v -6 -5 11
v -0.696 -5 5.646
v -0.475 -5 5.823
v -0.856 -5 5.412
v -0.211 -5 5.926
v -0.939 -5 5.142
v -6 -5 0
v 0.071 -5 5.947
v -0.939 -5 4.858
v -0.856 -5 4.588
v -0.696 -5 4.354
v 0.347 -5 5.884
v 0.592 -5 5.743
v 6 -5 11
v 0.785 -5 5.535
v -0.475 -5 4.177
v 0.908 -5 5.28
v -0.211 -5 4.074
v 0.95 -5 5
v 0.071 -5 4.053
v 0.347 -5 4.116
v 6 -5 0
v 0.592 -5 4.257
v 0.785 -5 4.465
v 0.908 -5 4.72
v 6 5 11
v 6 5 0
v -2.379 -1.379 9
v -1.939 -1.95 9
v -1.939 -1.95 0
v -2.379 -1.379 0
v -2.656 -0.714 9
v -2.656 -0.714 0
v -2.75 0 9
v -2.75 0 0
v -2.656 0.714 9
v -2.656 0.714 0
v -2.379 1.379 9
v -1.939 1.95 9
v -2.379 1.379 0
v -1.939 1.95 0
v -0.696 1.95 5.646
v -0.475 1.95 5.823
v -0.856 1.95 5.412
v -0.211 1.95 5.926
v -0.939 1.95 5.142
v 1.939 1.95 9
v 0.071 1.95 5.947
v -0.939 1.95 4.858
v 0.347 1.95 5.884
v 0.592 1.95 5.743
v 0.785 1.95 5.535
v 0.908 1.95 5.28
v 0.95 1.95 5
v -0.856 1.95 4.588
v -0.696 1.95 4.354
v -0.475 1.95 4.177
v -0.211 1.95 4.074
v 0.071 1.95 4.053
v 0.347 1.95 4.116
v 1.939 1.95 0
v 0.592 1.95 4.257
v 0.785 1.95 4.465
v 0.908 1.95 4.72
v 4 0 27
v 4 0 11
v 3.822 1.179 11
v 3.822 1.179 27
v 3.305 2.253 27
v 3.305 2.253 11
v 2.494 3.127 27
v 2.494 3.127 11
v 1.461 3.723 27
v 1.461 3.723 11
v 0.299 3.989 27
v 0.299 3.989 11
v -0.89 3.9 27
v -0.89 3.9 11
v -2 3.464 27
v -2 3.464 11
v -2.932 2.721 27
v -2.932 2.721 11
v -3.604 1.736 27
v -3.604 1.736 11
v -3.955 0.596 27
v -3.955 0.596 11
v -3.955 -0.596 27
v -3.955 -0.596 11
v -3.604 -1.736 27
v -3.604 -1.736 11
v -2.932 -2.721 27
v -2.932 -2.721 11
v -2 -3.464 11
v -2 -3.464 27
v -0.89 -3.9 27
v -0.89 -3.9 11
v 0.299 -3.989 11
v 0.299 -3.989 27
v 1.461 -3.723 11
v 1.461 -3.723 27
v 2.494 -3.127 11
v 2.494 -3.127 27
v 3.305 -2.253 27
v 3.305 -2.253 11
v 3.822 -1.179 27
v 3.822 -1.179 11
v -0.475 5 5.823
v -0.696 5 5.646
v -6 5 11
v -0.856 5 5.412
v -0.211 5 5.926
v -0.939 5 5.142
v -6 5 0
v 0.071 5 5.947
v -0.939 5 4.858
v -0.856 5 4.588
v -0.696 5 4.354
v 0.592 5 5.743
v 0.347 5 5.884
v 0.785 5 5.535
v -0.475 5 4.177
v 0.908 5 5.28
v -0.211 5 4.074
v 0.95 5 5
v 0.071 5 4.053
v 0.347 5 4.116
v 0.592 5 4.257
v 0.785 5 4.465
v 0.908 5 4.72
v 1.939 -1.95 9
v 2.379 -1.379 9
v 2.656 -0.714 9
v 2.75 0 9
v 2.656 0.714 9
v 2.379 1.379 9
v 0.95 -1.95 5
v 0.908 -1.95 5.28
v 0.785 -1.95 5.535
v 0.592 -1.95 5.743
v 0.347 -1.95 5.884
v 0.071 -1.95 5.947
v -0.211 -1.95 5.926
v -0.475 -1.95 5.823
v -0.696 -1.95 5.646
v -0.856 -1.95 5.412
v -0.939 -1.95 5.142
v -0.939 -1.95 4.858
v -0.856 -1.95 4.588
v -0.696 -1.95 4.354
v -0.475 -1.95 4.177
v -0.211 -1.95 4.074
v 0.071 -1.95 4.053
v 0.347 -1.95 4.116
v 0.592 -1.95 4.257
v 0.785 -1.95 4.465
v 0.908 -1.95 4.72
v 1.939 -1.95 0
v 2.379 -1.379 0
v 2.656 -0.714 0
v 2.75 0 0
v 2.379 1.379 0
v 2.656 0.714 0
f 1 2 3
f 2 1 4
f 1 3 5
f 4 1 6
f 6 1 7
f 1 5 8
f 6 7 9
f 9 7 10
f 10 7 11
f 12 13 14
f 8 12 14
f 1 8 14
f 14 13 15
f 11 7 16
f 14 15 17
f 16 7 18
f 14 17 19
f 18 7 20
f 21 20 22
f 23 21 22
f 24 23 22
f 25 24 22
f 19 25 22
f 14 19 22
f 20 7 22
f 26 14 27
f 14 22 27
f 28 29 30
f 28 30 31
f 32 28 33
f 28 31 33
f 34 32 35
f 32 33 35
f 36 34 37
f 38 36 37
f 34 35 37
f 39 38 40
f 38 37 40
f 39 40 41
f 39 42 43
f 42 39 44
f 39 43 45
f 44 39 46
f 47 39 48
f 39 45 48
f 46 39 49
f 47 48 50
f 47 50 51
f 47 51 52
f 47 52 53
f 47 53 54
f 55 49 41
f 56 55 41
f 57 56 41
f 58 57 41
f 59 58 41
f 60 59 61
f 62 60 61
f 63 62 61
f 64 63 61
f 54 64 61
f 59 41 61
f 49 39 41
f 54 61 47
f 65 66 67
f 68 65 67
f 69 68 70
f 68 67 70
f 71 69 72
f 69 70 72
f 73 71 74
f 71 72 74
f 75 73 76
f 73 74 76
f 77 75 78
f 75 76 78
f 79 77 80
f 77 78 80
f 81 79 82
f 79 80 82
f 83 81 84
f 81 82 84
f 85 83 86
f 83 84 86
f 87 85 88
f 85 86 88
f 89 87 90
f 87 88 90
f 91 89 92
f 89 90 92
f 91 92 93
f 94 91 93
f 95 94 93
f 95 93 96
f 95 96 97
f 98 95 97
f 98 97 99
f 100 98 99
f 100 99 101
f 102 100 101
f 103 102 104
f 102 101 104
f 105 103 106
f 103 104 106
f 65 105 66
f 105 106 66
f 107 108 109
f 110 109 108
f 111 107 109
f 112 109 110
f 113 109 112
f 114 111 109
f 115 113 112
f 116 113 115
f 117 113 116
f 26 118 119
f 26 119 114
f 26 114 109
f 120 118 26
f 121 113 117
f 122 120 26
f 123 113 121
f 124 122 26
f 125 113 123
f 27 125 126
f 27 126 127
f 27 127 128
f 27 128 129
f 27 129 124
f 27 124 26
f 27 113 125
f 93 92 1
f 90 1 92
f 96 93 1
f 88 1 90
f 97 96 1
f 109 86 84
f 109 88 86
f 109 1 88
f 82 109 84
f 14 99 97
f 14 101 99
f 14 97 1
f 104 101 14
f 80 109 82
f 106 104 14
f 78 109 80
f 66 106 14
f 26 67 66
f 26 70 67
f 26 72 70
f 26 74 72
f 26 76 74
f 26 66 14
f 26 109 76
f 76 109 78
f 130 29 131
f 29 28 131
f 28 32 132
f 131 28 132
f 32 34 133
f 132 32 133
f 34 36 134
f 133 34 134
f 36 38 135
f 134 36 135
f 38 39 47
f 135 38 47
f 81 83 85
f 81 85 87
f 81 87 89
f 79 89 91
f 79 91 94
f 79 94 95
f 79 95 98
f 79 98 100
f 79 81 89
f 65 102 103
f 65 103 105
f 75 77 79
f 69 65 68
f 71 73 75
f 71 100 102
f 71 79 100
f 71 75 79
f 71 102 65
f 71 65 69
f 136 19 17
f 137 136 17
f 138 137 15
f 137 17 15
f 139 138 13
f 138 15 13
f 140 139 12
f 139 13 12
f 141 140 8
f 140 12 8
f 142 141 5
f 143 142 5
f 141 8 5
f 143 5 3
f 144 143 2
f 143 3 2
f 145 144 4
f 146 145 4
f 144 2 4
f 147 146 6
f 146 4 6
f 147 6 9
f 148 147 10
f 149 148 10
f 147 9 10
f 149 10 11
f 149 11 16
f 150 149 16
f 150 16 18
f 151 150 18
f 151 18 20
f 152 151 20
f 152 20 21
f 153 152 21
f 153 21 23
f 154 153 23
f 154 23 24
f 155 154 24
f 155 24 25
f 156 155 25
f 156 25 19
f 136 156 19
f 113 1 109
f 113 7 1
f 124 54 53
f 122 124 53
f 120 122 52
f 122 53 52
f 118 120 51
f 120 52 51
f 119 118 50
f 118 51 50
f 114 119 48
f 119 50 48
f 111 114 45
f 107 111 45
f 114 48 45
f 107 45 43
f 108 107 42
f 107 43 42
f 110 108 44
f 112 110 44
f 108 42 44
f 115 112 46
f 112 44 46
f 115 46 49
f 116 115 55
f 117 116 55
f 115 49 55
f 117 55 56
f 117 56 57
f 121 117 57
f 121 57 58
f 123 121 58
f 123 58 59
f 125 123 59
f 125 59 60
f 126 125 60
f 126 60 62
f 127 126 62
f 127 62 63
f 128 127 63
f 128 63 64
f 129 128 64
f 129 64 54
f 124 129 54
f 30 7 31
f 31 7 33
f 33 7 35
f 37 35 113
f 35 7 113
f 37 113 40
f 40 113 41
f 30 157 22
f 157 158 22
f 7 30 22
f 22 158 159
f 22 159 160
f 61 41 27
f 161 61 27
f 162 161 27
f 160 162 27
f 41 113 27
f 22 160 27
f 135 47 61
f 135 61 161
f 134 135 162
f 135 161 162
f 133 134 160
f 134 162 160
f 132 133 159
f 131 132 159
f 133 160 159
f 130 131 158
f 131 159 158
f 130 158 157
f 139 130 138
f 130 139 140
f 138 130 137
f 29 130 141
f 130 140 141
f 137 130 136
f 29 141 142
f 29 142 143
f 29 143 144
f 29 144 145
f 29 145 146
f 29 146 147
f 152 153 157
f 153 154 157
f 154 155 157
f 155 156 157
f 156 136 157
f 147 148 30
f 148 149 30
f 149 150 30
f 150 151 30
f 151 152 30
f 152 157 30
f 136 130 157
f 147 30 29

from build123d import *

# Parameters (mm, degrees)
F0_W     = 12
F0_H     = 10
F1_DEPTH = 9
F2_R     = 0.95
F3_DEPTH = 10
F4_W     = 12
F4_H     = 10
F5_DEPTH = 2
F6_R     = 4
F7_DEPTH = 16


with BuildPart() as f1:
    # F0 (on Top) → F1 (new body)
    with BuildSketch(Plane.XY):
        Rectangle(F0_W, F0_H)
        with BuildLine():
            ThreePointArc((-1.939072, -1.95), (-2.75, 0), (-1.939072, 1.95))
            Line((-1.939072, 1.95), (1.939072, 1.95))
            ThreePointArc((1.939072, 1.95), (2.75, 0), (1.939072, -1.95))
            Line((1.939072, -1.95), (-1.939072, -1.95))
        make_face(mode=Mode.SUBTRACT)
    extrude(amount=F1_DEPTH)

    # F2 (on face) → F3 (cut, through all)
    with BuildSketch(Plane.XZ.offset(5)):
        with Locations((0, 5)):
            Circle(F2_R)
    extrude(amount=-F3_DEPTH, mode=Mode.SUBTRACT)

    # F4 (on face) → F5 (join)
    with BuildSketch(Plane.XY.offset(9)):
        Rectangle(F4_W, F4_H)
    extrude(amount=F5_DEPTH)

    # F6 (on face) → F7 (join)
    with BuildSketch(Plane.XY.offset(11)):
        Circle(F6_R)
    extrude(amount=F7_DEPTH)


solid = f1.part
